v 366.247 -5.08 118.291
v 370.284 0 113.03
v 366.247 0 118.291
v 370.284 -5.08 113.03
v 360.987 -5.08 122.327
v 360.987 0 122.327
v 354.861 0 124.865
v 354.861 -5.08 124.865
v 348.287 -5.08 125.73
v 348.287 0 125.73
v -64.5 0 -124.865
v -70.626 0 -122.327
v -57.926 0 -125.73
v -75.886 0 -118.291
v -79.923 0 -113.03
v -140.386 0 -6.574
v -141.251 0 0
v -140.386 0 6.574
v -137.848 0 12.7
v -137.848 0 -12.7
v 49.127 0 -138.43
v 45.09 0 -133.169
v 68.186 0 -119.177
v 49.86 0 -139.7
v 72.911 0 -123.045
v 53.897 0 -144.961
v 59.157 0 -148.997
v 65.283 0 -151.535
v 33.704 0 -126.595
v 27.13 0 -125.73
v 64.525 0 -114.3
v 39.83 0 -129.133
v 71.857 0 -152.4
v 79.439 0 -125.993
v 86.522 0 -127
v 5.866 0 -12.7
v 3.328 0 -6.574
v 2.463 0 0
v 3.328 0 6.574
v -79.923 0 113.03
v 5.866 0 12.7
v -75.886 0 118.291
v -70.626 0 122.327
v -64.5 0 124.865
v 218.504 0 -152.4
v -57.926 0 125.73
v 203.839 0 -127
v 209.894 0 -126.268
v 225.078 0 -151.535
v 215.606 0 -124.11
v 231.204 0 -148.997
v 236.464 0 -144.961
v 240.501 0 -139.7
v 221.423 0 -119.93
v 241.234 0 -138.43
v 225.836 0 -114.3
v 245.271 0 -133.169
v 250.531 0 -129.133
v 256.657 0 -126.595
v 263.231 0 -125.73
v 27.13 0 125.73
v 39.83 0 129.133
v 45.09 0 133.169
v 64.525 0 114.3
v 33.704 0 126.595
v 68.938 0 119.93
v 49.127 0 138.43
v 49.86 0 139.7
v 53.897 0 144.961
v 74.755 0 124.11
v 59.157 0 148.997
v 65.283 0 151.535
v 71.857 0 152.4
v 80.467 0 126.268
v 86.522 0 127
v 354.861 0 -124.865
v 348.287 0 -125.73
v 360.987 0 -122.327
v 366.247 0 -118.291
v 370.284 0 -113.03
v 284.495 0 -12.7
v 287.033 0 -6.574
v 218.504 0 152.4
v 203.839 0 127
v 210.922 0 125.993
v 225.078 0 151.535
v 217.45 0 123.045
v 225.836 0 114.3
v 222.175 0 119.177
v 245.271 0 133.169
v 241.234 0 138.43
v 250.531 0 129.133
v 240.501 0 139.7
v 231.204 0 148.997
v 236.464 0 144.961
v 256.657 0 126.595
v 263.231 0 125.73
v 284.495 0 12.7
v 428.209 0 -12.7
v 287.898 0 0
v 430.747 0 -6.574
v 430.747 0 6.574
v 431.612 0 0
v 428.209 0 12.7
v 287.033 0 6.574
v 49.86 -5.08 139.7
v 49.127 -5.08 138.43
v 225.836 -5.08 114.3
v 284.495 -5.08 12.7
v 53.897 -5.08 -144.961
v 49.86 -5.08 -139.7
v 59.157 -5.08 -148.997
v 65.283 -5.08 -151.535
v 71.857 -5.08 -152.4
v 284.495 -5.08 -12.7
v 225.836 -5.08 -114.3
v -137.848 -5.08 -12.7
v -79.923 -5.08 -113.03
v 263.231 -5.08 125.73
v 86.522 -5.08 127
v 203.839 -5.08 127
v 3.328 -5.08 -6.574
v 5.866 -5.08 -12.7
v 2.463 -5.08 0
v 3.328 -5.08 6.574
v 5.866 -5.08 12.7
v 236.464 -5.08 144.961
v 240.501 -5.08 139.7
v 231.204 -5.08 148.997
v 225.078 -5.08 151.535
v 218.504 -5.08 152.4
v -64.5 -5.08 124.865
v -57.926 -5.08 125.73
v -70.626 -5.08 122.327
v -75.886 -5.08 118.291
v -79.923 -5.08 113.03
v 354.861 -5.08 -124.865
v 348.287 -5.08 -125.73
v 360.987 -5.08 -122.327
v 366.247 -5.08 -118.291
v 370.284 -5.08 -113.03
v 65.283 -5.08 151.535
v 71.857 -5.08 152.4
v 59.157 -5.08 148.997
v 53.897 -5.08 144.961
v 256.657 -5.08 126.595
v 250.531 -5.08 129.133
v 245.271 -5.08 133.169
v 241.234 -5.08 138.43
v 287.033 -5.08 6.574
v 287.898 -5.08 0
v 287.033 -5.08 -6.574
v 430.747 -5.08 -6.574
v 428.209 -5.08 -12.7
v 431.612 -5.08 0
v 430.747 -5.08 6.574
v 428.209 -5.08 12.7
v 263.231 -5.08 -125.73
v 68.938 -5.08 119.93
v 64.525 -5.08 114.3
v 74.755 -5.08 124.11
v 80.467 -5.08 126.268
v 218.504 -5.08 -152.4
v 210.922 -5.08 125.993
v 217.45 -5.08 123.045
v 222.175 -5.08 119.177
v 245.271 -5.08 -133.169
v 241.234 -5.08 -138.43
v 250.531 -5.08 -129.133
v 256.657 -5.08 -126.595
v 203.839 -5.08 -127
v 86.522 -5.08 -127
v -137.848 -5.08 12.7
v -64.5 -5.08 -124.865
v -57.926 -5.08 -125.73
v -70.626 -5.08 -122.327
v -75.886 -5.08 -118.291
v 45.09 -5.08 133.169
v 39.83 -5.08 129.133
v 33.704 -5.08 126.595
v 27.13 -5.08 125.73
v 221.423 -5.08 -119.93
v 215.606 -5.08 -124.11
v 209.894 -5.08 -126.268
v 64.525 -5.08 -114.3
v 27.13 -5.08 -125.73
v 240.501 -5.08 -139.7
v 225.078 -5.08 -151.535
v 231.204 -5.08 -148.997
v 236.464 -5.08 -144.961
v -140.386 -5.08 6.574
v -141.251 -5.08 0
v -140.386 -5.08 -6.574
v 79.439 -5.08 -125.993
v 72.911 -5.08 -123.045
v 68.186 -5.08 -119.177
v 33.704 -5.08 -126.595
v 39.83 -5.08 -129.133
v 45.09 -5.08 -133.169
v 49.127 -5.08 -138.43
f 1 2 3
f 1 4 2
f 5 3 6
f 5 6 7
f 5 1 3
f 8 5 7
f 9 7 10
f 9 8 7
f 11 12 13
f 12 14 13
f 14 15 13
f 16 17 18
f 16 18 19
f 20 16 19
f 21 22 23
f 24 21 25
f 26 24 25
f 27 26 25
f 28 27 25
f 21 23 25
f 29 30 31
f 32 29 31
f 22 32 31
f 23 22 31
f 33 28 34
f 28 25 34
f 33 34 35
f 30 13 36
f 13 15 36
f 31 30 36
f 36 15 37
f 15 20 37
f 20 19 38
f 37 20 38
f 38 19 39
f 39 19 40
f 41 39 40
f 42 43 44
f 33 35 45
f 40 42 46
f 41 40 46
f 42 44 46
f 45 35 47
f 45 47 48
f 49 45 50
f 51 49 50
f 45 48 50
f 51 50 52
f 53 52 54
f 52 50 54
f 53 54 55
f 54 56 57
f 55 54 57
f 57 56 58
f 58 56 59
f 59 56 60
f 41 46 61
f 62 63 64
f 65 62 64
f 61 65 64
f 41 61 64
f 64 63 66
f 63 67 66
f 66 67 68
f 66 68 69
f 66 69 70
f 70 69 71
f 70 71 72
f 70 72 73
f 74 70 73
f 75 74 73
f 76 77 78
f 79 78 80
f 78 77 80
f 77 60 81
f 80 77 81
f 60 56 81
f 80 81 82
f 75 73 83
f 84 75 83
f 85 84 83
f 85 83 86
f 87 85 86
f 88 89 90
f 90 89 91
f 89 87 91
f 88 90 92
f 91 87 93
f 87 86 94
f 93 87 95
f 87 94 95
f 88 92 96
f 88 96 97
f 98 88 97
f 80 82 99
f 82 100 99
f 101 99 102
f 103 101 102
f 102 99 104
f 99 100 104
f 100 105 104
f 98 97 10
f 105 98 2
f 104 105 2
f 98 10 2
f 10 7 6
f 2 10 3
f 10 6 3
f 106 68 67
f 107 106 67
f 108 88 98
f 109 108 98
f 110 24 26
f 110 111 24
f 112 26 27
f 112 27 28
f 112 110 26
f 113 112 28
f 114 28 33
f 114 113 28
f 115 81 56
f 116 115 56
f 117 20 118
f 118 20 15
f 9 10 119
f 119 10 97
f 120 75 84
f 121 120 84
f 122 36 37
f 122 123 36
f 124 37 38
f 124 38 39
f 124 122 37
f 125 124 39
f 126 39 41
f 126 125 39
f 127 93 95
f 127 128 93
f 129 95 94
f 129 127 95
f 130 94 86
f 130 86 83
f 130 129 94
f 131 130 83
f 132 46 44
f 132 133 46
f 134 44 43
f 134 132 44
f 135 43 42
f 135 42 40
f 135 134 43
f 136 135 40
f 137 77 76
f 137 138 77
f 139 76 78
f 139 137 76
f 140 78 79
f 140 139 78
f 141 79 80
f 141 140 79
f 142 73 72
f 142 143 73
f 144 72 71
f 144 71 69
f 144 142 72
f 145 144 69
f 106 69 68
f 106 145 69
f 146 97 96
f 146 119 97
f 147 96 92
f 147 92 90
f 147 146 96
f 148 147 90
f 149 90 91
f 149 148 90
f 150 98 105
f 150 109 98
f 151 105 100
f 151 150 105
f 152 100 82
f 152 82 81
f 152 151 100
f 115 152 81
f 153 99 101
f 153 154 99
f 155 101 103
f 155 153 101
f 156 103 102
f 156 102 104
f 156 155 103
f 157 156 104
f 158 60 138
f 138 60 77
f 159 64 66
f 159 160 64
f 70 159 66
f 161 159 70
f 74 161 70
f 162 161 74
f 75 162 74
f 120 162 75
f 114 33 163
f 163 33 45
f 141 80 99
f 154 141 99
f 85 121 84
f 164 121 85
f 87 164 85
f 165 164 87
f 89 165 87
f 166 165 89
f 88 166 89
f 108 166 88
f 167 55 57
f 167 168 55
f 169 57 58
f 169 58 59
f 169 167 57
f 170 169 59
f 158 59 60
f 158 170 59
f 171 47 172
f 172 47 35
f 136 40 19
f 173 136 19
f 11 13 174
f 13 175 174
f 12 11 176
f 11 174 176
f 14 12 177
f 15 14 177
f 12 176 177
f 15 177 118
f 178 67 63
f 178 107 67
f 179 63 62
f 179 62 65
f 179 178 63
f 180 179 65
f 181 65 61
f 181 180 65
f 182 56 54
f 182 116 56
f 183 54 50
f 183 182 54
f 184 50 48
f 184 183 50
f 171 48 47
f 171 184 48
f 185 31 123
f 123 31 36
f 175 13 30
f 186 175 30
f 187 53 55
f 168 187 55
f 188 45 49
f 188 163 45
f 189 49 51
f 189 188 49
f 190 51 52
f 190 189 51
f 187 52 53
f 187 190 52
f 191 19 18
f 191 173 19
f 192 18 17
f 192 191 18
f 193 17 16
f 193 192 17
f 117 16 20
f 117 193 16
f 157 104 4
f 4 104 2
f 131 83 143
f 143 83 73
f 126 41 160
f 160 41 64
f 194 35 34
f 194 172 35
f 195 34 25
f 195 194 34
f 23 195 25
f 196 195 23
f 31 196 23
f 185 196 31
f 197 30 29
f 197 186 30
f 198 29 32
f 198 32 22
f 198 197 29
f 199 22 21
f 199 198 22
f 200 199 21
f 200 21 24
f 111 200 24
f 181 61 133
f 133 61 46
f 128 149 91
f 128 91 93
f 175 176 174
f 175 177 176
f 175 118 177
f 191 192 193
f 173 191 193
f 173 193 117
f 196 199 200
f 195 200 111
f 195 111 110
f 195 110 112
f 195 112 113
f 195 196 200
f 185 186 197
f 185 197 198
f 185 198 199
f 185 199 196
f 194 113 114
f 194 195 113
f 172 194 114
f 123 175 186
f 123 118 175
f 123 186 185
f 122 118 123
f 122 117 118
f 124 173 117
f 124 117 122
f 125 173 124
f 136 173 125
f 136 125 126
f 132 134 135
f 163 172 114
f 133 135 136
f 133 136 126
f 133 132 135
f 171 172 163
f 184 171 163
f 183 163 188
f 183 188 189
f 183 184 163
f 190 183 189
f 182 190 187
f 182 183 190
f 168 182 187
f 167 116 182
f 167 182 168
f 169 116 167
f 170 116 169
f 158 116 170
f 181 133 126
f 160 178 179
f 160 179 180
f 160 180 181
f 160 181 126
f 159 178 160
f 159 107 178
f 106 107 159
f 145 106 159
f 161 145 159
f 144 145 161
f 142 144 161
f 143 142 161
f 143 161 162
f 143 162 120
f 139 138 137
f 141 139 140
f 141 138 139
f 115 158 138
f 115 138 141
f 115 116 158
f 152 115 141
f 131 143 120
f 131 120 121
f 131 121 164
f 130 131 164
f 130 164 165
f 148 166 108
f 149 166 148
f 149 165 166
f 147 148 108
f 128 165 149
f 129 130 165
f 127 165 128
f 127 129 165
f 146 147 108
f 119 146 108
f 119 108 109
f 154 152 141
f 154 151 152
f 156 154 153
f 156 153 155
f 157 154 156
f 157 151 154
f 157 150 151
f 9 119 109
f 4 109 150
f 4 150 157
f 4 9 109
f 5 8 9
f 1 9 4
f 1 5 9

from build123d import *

# Parameters (mm, degrees)
F1_DEPTH = 5.08
F2_R     = 25.4


with BuildPart() as f1:
    # F0 (on Front) → F1 (new body)
    with BuildSketch(Plane.XZ):
        Polygon((-72.5902493452, -125.73), (41.7943859866, -125.73), (-30.7958633586, 0), (41.7943859866, 125.73), (-72.5902493452, 125.73), (-145.1804986904, 0), align=None)
        Polygon((41.7943859866, -125.73), (71.1237796615, -125.73), (-1.4664696837, 0), (71.1237796615, 125.73), (41.7943859866, 125.73), (-30.7958633586, 0), align=None)
        Polygon((41.7943859866, 125.73), (71.1237796615, 125.73), (71.8570145033, 127), (218.5039828775, 127), (219.2372177194, 125.73), (248.5666113942, 125.73), (233.1686797149, 152.4), (57.1923176659, 152.4), align=None)
        Polygon((291.8274670646, 0), (219.2372177194, -125.73), (248.5666113942, -125.73), (321.1568607394, 0), (248.5666113942, 125.73), (219.2372177194, 125.73), align=None)
        Polygon((321.1568607394, 0), (248.5666113942, -125.73), (362.9512467261, -125.73), (435.5414960713, 0), (362.9512467261, 125.73), (248.5666113942, 125.73), align=None)
        Polygon((71.8570145033, -127), (71.1237796615, -125.73), (41.7943859866, -125.73), (57.1923176659, -152.4), (233.1686797149, -152.4), (248.5666113942, -125.73), (219.2372177194, -125.73), (218.5039828775, -127), align=None)
    extrude(amount=F1_DEPTH)

    # F2
    f2_edges = [f1.edges().sort_by_distance(p)[0] for p in [
        (41.794386, -2.54, 125.73),
        (-72.590249, -2.54, 125.73),
        (-145.180499, -2.54, 0),
        (-72.590249, -2.54, -125.73),
        (41.794386, -2.54, -125.73),
        (57.192318, -2.54, -152.4),
        (233.16868, -2.54, -152.4),
        (248.566611, -2.54, -125.73),
        (362.951247, -2.54, -125.73),
        (435.541496, -2.54, 0),
        (362.951247, -2.54, 125.73),
        (248.566611, -2.54, 125.73),
        (233.16868, -2.54, 152.4),
        (57.192318, -2.54, 152.4),
        (71.857015, -2.54, 127),
        (218.503983, -2.54, 127),
        (291.827467, -2.54, 0),
        (218.503983, -2.54, -127),
        (71.857015, -2.54, -127),
        (-1.46647, -2.54, 0),
    ]]
    fillet(f2_edges, radius=F2_R)


solid = f1.part
